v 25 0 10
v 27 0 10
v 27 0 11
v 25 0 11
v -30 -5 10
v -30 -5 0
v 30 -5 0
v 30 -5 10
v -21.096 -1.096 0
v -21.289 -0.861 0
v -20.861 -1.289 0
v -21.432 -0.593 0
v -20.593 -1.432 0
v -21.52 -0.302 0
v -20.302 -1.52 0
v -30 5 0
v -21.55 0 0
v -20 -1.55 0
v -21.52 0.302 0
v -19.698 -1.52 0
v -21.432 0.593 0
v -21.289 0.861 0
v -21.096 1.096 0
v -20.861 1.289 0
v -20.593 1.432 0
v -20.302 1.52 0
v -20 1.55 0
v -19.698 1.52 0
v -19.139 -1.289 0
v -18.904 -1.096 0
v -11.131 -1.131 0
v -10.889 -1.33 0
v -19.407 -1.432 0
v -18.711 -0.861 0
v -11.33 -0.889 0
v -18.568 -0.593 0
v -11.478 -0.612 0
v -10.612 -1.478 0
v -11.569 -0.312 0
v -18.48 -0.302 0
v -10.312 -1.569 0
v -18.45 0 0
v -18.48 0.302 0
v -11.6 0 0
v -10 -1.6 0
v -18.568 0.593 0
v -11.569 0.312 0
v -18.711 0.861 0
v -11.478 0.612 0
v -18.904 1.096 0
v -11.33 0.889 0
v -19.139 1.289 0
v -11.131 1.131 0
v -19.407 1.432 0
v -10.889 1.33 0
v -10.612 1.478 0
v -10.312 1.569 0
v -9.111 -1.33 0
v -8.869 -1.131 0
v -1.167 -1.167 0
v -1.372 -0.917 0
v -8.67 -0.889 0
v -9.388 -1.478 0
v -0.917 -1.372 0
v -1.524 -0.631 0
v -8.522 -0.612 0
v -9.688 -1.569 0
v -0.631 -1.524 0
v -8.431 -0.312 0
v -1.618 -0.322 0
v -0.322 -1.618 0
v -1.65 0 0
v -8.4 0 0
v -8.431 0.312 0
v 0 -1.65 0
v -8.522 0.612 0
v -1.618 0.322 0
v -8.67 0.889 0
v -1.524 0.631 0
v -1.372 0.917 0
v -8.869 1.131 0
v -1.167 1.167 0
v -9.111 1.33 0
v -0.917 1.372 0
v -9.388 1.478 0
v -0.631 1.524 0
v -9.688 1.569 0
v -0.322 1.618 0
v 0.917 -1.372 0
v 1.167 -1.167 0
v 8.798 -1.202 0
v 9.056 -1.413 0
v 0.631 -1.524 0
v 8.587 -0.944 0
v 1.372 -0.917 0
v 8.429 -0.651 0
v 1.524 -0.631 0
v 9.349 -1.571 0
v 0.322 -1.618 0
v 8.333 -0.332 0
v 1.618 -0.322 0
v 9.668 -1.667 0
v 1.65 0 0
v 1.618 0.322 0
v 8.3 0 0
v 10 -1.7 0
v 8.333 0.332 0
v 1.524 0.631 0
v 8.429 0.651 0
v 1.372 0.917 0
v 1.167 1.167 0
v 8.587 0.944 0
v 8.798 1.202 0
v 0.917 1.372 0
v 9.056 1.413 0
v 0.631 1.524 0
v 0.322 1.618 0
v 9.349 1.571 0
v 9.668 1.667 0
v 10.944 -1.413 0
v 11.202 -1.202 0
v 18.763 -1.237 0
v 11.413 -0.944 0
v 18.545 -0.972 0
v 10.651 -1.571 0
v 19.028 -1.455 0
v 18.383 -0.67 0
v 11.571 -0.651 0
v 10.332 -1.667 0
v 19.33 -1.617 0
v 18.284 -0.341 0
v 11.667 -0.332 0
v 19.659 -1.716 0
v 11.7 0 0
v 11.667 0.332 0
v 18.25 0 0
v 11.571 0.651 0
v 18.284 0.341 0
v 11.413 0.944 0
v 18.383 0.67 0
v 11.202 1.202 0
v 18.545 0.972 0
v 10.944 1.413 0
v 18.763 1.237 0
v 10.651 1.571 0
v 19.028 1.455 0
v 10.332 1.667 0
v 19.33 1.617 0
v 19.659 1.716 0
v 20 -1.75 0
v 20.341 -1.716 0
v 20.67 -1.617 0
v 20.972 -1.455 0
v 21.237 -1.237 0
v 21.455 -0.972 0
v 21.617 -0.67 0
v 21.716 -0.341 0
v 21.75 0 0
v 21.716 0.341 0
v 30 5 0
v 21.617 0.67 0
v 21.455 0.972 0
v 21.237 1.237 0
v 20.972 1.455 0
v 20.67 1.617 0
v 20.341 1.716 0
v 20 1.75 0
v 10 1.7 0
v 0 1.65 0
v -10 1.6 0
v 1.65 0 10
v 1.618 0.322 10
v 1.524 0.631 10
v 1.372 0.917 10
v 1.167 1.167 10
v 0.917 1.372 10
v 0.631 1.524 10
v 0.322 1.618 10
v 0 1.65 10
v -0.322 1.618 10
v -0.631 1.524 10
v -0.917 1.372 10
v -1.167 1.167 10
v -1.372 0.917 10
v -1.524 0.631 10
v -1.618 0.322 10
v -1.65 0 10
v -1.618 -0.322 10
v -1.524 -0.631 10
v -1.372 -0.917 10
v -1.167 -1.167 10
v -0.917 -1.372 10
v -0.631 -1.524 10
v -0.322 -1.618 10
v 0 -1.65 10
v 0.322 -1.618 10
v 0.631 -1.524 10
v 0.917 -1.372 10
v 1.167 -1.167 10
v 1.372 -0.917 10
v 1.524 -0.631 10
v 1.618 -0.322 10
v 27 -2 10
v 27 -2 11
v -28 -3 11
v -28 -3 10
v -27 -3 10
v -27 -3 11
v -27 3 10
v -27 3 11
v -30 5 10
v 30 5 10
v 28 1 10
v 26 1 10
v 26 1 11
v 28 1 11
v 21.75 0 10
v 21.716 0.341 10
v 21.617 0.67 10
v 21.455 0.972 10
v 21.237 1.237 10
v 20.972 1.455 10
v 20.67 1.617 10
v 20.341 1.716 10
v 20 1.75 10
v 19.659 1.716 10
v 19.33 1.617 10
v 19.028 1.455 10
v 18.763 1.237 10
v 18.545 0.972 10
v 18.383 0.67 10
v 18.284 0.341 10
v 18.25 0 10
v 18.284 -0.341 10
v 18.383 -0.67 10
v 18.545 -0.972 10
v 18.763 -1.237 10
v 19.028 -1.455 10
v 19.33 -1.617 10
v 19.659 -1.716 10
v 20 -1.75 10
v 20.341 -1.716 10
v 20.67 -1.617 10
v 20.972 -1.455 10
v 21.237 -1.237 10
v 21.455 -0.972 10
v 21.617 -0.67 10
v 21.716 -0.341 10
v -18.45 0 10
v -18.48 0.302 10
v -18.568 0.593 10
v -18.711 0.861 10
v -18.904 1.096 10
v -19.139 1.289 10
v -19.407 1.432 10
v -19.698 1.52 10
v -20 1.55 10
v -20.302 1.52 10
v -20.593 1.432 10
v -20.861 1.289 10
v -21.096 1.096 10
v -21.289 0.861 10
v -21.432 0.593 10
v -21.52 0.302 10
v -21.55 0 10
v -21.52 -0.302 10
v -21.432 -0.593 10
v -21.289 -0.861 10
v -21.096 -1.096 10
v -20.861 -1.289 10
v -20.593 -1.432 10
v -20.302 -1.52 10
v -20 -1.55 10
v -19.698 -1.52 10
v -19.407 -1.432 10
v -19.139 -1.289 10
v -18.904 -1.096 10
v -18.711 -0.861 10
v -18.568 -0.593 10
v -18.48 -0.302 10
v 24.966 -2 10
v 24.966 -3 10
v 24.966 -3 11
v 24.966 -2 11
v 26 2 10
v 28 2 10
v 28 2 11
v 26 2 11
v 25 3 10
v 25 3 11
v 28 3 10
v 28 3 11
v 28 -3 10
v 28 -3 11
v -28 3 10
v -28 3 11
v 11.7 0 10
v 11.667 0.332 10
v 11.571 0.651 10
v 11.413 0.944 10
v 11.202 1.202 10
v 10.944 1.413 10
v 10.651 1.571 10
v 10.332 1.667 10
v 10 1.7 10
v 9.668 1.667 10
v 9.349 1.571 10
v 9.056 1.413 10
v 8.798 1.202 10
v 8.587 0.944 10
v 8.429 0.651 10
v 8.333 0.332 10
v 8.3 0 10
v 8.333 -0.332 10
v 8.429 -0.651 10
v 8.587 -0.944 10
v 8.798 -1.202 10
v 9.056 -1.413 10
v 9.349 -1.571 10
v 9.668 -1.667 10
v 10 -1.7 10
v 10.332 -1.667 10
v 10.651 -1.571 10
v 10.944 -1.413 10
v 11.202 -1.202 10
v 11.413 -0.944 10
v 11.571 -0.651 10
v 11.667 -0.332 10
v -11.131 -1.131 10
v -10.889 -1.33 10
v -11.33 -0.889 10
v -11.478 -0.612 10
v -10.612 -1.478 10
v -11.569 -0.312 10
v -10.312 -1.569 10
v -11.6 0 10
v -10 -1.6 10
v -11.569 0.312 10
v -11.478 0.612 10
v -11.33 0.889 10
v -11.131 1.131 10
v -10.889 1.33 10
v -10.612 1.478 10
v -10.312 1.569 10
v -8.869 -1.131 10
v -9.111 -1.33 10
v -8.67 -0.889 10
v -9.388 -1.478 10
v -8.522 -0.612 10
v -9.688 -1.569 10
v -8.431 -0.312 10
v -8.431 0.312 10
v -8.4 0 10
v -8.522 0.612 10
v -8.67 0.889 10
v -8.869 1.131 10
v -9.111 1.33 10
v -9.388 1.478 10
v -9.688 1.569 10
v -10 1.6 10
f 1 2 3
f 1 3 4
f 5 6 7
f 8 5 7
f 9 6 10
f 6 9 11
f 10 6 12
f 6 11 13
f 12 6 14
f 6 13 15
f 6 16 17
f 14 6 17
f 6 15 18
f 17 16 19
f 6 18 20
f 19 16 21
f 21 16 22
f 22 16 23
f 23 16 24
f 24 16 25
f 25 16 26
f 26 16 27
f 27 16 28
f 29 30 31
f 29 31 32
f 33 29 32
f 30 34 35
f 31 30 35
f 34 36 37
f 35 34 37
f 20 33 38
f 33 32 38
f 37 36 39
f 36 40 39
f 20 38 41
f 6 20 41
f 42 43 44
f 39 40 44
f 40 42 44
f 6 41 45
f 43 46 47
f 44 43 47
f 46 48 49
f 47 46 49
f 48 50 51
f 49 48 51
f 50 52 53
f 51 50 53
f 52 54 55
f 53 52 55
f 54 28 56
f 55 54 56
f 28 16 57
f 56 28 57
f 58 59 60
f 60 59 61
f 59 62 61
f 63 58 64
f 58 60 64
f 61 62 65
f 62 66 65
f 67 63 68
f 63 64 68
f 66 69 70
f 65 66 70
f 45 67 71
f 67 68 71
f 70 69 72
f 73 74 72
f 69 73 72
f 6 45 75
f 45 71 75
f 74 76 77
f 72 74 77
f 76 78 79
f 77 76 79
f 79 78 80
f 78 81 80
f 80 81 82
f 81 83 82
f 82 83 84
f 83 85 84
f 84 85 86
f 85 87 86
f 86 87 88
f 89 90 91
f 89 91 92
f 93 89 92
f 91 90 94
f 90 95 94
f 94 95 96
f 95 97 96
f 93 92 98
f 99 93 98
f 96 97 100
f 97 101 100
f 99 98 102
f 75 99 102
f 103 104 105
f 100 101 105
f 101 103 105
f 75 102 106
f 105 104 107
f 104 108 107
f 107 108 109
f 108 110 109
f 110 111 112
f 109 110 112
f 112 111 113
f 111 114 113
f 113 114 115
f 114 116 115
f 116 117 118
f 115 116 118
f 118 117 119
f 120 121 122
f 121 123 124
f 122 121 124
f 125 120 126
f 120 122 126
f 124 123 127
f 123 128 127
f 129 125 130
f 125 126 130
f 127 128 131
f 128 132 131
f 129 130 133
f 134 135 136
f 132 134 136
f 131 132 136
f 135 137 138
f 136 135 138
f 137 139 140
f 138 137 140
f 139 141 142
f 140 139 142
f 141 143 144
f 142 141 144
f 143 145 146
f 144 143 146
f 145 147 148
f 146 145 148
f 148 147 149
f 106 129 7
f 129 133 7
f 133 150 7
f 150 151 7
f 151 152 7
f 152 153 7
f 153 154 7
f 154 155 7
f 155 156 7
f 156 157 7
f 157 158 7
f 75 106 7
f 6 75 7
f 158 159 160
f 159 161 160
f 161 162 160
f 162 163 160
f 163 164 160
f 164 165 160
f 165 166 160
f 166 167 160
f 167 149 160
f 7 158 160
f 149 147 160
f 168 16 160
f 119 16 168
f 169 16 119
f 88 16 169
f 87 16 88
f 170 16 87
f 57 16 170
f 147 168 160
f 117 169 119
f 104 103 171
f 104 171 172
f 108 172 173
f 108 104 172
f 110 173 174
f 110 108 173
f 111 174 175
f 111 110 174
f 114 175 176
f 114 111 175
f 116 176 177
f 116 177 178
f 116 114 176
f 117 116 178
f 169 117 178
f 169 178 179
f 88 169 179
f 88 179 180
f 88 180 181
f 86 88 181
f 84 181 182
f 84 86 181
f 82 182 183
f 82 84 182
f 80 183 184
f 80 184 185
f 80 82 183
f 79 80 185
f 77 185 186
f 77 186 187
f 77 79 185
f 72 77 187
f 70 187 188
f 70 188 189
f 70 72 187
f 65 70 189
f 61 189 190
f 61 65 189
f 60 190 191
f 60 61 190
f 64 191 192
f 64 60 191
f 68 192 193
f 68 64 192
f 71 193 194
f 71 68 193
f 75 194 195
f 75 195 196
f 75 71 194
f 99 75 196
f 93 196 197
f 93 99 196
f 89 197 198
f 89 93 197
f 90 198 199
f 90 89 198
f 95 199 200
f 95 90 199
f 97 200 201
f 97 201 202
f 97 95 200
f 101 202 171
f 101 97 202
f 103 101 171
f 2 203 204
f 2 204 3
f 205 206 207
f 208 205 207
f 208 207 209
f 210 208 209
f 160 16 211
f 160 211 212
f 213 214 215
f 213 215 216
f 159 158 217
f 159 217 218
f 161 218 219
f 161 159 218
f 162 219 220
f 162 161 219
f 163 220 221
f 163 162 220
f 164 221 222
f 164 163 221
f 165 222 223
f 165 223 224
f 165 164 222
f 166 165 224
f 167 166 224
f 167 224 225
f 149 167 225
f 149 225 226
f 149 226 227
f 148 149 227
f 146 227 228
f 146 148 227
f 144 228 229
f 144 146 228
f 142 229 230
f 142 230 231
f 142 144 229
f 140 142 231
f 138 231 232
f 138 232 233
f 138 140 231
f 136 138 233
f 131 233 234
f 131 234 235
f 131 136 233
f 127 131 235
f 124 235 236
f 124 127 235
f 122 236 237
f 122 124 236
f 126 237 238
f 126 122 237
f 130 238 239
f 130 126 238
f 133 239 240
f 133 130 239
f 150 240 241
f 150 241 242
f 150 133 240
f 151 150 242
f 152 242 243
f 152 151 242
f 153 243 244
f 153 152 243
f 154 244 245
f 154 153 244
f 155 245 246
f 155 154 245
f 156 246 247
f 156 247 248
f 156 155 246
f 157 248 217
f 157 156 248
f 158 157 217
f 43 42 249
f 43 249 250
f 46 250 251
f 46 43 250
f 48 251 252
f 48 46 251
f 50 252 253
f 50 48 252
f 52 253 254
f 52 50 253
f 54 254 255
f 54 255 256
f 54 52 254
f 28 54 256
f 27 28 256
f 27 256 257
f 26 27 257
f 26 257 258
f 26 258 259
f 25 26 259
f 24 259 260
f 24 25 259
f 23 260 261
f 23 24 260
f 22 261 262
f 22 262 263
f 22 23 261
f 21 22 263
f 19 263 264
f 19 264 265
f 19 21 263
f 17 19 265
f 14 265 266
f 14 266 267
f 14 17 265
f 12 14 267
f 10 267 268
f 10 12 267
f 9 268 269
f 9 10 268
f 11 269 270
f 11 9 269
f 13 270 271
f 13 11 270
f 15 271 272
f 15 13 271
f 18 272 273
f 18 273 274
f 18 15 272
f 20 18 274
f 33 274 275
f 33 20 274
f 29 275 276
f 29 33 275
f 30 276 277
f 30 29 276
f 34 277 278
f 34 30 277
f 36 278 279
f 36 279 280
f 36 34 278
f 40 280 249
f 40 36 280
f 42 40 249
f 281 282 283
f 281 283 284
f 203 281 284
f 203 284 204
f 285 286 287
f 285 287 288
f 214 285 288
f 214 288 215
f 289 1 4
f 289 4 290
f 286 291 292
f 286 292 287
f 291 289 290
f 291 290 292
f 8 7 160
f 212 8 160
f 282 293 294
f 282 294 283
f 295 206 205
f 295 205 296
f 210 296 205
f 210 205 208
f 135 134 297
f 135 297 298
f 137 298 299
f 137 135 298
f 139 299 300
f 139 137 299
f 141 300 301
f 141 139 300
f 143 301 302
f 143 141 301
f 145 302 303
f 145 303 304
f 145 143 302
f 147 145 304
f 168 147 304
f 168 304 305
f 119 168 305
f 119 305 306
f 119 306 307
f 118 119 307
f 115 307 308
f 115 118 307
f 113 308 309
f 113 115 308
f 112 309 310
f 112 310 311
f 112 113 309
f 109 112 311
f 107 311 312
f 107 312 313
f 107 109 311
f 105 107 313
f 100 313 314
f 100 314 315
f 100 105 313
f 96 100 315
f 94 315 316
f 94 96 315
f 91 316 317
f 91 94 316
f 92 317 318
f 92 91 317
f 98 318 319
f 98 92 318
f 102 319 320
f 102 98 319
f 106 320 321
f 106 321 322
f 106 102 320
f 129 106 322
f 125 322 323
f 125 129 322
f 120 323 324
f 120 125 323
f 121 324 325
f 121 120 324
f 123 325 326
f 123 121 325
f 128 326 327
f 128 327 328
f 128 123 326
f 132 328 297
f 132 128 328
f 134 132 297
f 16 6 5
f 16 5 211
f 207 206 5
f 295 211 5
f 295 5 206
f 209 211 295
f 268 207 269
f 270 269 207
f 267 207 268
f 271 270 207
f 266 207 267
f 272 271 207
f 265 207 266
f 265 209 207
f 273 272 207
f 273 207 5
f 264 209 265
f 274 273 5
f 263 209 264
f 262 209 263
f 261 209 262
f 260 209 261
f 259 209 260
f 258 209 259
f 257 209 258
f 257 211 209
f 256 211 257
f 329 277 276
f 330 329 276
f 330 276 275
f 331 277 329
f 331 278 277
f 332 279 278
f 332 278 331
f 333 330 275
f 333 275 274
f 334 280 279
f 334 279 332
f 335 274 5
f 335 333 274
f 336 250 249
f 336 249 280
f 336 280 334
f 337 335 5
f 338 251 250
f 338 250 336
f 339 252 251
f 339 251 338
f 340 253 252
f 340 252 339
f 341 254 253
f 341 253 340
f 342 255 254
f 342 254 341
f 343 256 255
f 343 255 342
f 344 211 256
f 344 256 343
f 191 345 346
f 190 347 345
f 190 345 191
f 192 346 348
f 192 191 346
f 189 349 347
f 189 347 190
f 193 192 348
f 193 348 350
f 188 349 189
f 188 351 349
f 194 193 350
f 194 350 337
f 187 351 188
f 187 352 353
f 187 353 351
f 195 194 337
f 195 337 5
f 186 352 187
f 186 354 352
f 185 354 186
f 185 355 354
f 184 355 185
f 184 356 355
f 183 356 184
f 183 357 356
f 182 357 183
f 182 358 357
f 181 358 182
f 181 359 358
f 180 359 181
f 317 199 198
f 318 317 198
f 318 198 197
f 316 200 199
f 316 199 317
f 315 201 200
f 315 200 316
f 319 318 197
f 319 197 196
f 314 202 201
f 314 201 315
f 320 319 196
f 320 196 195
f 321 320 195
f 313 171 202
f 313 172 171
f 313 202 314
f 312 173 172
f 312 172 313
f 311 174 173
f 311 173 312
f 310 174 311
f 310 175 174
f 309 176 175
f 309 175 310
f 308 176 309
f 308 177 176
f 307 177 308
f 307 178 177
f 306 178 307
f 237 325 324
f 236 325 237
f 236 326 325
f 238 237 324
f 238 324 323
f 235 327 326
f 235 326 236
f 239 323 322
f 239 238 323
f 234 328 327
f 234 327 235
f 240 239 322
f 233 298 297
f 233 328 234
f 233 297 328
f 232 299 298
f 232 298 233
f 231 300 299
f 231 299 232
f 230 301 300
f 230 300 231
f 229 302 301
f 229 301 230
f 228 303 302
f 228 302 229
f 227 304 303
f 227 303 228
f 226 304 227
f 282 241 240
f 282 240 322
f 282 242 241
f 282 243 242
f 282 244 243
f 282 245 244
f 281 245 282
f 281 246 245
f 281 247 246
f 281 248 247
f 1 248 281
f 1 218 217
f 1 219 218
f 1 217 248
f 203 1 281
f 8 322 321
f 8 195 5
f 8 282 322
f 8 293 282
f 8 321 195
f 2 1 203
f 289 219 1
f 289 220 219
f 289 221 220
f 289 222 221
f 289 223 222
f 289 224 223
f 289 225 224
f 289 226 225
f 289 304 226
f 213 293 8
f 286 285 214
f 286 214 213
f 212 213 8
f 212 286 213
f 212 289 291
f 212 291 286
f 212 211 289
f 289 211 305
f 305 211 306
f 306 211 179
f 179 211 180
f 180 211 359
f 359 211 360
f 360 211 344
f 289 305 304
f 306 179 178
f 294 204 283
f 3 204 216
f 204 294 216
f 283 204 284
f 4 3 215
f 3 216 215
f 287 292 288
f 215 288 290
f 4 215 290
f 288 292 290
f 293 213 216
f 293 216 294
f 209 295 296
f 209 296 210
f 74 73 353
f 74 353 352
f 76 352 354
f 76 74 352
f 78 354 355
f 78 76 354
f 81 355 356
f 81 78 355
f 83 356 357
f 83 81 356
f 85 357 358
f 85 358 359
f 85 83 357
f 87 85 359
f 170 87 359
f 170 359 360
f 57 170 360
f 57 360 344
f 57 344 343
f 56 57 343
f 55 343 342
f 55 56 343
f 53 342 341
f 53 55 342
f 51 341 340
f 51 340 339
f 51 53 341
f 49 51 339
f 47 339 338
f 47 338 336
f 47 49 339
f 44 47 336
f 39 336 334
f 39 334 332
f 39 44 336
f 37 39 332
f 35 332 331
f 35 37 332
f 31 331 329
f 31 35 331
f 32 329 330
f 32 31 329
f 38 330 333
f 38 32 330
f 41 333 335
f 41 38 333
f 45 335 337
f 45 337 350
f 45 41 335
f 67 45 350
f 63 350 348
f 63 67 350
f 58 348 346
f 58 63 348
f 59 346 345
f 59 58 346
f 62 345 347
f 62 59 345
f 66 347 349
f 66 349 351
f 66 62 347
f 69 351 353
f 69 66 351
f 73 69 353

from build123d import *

# Parameters (mm, degrees)
SKETCH_W     = 60
SKETCH_H     = 10
SKETCH_R     = 1.55
SKETCH_R_2   = 1.6
SKETCH_R_3   = 1.65
SKETCH_R_4   = 1.7
SKETCH_R_5   = 1.75
PAD_DEPTH    = 10
SKETCH001_W  = 1
SKETCH001_H  = 6
PAD001_DEPTH = 1


with BuildPart() as part:
    # Sketch → Pad (new body)
    with BuildSketch(Plane.XY):
        Rectangle(SKETCH_W, SKETCH_H)
        with Locations((-20, 0)):
            Circle(SKETCH_R, mode=Mode.SUBTRACT)
        with Locations((-10, 0)):
            Circle(SKETCH_R_2, mode=Mode.SUBTRACT)
        Circle(SKETCH_R_3, mode=Mode.SUBTRACT)
        with Locations((10, 0)):
            Circle(SKETCH_R_4, mode=Mode.SUBTRACT)
        with Locations((20, 0)):
            Circle(SKETCH_R_5, mode=Mode.SUBTRACT)
    extrude(amount=PAD_DEPTH)

    # Sketch001 → Pad001 (join)
    with BuildSketch(Plane.XY.offset(10)):
        with Locations((-27.5, 0)):
            Rectangle(SKETCH001_W, SKETCH001_H)
        Polygon((25, 3), (28, 3), (28, 2), (26, 2), (26, 1), (28, 1), (28, -3), (24.966125, -3), (24.966125, -2), (27, -2), (27, 0), (25, 0), align=None)
    extrude(amount=PAD001_DEPTH)


solid = part.part
